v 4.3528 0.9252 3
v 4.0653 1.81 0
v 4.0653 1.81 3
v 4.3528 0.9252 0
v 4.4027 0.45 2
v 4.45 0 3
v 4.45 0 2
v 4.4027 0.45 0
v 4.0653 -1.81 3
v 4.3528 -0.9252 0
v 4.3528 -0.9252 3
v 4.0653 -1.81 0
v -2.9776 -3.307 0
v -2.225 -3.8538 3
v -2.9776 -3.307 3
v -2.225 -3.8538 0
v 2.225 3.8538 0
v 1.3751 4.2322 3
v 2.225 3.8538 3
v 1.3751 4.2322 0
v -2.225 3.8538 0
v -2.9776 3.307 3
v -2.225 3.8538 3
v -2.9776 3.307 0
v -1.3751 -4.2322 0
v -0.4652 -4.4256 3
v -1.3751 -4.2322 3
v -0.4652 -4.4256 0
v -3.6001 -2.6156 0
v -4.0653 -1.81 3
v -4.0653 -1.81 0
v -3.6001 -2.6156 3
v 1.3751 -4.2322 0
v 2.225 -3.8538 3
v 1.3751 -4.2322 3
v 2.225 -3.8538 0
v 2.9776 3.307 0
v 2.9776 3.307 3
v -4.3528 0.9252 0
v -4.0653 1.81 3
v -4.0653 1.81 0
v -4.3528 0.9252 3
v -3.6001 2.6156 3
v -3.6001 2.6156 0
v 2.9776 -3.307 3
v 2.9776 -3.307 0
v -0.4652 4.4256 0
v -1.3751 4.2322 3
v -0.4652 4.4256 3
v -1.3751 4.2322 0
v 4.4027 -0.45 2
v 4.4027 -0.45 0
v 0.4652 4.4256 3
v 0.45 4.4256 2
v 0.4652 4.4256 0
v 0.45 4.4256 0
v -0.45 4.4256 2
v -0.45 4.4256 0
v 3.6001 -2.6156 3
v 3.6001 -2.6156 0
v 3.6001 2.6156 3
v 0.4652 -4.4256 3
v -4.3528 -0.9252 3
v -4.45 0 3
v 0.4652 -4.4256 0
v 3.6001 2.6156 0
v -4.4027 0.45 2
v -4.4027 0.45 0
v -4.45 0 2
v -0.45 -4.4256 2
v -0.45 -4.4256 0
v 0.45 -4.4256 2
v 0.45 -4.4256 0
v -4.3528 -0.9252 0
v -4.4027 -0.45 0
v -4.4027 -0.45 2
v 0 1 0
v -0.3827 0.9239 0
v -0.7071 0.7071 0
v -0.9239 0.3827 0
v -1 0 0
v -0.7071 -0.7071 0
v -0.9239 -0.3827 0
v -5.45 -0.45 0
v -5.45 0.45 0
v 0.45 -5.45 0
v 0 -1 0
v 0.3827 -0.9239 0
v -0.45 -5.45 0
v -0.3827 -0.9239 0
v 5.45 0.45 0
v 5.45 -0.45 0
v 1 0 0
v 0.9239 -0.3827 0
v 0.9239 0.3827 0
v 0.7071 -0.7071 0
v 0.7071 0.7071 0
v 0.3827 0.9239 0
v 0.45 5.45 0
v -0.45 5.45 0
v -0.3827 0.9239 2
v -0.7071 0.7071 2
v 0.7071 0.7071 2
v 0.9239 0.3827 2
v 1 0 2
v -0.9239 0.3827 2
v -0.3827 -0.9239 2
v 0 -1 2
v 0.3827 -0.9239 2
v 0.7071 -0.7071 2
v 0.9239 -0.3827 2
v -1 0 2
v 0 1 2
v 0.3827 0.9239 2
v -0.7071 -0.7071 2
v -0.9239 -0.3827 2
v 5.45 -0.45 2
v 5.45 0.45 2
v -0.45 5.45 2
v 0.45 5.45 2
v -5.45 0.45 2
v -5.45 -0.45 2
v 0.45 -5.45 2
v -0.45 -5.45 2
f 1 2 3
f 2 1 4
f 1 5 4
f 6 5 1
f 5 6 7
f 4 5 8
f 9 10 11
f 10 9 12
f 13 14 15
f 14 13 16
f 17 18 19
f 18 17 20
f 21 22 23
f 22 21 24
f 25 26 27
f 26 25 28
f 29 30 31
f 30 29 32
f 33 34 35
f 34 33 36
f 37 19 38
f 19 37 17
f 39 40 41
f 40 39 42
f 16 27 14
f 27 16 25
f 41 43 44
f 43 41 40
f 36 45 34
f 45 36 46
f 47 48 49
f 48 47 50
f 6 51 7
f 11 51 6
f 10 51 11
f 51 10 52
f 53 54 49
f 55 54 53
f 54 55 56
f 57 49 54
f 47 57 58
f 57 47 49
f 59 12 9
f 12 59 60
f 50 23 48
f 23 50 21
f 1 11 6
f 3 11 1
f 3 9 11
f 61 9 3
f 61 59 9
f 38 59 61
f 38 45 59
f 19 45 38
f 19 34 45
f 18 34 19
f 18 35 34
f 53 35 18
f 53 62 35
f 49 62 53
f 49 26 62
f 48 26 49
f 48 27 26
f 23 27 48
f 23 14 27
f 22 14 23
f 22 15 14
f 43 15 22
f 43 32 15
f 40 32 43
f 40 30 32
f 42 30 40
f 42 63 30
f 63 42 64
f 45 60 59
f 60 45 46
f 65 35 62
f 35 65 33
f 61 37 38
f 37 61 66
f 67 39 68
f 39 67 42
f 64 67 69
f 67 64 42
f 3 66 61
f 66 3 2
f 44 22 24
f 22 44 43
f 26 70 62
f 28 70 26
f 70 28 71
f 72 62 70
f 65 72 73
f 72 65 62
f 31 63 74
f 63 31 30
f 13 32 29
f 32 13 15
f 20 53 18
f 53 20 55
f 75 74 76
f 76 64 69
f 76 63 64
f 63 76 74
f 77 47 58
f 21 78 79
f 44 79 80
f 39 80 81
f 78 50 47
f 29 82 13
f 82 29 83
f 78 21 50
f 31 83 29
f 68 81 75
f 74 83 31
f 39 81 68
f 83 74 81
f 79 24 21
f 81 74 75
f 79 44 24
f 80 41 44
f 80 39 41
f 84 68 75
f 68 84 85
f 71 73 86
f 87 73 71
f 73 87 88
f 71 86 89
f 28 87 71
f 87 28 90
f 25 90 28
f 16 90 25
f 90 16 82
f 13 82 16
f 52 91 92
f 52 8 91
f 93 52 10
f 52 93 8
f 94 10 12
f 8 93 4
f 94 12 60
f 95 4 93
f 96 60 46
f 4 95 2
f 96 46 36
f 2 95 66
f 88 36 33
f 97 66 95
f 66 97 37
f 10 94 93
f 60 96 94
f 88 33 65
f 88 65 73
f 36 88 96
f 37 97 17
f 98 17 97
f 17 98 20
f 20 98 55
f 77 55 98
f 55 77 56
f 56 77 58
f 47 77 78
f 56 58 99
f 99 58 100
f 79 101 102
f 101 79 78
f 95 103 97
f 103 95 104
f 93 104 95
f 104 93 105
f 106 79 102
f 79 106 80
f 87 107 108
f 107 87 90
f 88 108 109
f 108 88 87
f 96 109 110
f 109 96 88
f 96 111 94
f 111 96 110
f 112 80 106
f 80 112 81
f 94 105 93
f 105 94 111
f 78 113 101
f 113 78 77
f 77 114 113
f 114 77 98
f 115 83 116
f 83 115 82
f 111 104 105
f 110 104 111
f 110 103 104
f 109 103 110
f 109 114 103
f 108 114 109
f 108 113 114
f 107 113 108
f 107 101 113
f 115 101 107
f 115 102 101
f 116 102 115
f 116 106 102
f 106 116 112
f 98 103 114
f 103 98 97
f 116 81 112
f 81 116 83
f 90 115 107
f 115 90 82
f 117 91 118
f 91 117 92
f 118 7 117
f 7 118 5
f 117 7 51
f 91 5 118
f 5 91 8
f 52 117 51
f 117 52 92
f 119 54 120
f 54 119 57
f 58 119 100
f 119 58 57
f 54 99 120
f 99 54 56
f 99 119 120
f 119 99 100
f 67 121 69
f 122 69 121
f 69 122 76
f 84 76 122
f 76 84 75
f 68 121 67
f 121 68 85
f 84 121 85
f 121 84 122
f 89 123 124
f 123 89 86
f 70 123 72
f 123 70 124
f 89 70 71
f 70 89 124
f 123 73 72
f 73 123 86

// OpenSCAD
$fs = 0.4;

R = 8.9 / 2; // Button radius.
WALLS = 1; // Case wall thickness.
HPCB = 3; // Height of the button PCB.
SPACE = 6; // Distance between main PCB and front panel.
PRESS = 1; // How much the button moves when pressed.
HCOL = 3; // Height of the button's black shaft.
RCOL = 2 / 2; // Radius of the button's black shaft.
WRAIL = 0.9; // Width of the rail.

BTN_HEIGHT = SPACE + WALLS - PRESS - HPCB;
assert(SPACE - PRESS - HPCB > 0);
assert(BTN_HEIGHT > 0);
assert(HCOL - PRESS > 0);

module rail() {
  translate([RCOL, -WRAIL / 2, 0])
    cube([R - RCOL + 1, WRAIL, SPACE - PRESS - HPCB]);
}

module power_button() {
  color("#b13e53") union() {
      difference() {
        cylinder(h=BTN_HEIGHT, r=R);
        translate([0, 0, -.1])
          cylinder(h=HCOL - PRESS + .1, r=RCOL);
      }
      rail();
      rotate(90) rail();
      rotate(180) rail();
      rotate(270) rail();
    }
}

power_button();
